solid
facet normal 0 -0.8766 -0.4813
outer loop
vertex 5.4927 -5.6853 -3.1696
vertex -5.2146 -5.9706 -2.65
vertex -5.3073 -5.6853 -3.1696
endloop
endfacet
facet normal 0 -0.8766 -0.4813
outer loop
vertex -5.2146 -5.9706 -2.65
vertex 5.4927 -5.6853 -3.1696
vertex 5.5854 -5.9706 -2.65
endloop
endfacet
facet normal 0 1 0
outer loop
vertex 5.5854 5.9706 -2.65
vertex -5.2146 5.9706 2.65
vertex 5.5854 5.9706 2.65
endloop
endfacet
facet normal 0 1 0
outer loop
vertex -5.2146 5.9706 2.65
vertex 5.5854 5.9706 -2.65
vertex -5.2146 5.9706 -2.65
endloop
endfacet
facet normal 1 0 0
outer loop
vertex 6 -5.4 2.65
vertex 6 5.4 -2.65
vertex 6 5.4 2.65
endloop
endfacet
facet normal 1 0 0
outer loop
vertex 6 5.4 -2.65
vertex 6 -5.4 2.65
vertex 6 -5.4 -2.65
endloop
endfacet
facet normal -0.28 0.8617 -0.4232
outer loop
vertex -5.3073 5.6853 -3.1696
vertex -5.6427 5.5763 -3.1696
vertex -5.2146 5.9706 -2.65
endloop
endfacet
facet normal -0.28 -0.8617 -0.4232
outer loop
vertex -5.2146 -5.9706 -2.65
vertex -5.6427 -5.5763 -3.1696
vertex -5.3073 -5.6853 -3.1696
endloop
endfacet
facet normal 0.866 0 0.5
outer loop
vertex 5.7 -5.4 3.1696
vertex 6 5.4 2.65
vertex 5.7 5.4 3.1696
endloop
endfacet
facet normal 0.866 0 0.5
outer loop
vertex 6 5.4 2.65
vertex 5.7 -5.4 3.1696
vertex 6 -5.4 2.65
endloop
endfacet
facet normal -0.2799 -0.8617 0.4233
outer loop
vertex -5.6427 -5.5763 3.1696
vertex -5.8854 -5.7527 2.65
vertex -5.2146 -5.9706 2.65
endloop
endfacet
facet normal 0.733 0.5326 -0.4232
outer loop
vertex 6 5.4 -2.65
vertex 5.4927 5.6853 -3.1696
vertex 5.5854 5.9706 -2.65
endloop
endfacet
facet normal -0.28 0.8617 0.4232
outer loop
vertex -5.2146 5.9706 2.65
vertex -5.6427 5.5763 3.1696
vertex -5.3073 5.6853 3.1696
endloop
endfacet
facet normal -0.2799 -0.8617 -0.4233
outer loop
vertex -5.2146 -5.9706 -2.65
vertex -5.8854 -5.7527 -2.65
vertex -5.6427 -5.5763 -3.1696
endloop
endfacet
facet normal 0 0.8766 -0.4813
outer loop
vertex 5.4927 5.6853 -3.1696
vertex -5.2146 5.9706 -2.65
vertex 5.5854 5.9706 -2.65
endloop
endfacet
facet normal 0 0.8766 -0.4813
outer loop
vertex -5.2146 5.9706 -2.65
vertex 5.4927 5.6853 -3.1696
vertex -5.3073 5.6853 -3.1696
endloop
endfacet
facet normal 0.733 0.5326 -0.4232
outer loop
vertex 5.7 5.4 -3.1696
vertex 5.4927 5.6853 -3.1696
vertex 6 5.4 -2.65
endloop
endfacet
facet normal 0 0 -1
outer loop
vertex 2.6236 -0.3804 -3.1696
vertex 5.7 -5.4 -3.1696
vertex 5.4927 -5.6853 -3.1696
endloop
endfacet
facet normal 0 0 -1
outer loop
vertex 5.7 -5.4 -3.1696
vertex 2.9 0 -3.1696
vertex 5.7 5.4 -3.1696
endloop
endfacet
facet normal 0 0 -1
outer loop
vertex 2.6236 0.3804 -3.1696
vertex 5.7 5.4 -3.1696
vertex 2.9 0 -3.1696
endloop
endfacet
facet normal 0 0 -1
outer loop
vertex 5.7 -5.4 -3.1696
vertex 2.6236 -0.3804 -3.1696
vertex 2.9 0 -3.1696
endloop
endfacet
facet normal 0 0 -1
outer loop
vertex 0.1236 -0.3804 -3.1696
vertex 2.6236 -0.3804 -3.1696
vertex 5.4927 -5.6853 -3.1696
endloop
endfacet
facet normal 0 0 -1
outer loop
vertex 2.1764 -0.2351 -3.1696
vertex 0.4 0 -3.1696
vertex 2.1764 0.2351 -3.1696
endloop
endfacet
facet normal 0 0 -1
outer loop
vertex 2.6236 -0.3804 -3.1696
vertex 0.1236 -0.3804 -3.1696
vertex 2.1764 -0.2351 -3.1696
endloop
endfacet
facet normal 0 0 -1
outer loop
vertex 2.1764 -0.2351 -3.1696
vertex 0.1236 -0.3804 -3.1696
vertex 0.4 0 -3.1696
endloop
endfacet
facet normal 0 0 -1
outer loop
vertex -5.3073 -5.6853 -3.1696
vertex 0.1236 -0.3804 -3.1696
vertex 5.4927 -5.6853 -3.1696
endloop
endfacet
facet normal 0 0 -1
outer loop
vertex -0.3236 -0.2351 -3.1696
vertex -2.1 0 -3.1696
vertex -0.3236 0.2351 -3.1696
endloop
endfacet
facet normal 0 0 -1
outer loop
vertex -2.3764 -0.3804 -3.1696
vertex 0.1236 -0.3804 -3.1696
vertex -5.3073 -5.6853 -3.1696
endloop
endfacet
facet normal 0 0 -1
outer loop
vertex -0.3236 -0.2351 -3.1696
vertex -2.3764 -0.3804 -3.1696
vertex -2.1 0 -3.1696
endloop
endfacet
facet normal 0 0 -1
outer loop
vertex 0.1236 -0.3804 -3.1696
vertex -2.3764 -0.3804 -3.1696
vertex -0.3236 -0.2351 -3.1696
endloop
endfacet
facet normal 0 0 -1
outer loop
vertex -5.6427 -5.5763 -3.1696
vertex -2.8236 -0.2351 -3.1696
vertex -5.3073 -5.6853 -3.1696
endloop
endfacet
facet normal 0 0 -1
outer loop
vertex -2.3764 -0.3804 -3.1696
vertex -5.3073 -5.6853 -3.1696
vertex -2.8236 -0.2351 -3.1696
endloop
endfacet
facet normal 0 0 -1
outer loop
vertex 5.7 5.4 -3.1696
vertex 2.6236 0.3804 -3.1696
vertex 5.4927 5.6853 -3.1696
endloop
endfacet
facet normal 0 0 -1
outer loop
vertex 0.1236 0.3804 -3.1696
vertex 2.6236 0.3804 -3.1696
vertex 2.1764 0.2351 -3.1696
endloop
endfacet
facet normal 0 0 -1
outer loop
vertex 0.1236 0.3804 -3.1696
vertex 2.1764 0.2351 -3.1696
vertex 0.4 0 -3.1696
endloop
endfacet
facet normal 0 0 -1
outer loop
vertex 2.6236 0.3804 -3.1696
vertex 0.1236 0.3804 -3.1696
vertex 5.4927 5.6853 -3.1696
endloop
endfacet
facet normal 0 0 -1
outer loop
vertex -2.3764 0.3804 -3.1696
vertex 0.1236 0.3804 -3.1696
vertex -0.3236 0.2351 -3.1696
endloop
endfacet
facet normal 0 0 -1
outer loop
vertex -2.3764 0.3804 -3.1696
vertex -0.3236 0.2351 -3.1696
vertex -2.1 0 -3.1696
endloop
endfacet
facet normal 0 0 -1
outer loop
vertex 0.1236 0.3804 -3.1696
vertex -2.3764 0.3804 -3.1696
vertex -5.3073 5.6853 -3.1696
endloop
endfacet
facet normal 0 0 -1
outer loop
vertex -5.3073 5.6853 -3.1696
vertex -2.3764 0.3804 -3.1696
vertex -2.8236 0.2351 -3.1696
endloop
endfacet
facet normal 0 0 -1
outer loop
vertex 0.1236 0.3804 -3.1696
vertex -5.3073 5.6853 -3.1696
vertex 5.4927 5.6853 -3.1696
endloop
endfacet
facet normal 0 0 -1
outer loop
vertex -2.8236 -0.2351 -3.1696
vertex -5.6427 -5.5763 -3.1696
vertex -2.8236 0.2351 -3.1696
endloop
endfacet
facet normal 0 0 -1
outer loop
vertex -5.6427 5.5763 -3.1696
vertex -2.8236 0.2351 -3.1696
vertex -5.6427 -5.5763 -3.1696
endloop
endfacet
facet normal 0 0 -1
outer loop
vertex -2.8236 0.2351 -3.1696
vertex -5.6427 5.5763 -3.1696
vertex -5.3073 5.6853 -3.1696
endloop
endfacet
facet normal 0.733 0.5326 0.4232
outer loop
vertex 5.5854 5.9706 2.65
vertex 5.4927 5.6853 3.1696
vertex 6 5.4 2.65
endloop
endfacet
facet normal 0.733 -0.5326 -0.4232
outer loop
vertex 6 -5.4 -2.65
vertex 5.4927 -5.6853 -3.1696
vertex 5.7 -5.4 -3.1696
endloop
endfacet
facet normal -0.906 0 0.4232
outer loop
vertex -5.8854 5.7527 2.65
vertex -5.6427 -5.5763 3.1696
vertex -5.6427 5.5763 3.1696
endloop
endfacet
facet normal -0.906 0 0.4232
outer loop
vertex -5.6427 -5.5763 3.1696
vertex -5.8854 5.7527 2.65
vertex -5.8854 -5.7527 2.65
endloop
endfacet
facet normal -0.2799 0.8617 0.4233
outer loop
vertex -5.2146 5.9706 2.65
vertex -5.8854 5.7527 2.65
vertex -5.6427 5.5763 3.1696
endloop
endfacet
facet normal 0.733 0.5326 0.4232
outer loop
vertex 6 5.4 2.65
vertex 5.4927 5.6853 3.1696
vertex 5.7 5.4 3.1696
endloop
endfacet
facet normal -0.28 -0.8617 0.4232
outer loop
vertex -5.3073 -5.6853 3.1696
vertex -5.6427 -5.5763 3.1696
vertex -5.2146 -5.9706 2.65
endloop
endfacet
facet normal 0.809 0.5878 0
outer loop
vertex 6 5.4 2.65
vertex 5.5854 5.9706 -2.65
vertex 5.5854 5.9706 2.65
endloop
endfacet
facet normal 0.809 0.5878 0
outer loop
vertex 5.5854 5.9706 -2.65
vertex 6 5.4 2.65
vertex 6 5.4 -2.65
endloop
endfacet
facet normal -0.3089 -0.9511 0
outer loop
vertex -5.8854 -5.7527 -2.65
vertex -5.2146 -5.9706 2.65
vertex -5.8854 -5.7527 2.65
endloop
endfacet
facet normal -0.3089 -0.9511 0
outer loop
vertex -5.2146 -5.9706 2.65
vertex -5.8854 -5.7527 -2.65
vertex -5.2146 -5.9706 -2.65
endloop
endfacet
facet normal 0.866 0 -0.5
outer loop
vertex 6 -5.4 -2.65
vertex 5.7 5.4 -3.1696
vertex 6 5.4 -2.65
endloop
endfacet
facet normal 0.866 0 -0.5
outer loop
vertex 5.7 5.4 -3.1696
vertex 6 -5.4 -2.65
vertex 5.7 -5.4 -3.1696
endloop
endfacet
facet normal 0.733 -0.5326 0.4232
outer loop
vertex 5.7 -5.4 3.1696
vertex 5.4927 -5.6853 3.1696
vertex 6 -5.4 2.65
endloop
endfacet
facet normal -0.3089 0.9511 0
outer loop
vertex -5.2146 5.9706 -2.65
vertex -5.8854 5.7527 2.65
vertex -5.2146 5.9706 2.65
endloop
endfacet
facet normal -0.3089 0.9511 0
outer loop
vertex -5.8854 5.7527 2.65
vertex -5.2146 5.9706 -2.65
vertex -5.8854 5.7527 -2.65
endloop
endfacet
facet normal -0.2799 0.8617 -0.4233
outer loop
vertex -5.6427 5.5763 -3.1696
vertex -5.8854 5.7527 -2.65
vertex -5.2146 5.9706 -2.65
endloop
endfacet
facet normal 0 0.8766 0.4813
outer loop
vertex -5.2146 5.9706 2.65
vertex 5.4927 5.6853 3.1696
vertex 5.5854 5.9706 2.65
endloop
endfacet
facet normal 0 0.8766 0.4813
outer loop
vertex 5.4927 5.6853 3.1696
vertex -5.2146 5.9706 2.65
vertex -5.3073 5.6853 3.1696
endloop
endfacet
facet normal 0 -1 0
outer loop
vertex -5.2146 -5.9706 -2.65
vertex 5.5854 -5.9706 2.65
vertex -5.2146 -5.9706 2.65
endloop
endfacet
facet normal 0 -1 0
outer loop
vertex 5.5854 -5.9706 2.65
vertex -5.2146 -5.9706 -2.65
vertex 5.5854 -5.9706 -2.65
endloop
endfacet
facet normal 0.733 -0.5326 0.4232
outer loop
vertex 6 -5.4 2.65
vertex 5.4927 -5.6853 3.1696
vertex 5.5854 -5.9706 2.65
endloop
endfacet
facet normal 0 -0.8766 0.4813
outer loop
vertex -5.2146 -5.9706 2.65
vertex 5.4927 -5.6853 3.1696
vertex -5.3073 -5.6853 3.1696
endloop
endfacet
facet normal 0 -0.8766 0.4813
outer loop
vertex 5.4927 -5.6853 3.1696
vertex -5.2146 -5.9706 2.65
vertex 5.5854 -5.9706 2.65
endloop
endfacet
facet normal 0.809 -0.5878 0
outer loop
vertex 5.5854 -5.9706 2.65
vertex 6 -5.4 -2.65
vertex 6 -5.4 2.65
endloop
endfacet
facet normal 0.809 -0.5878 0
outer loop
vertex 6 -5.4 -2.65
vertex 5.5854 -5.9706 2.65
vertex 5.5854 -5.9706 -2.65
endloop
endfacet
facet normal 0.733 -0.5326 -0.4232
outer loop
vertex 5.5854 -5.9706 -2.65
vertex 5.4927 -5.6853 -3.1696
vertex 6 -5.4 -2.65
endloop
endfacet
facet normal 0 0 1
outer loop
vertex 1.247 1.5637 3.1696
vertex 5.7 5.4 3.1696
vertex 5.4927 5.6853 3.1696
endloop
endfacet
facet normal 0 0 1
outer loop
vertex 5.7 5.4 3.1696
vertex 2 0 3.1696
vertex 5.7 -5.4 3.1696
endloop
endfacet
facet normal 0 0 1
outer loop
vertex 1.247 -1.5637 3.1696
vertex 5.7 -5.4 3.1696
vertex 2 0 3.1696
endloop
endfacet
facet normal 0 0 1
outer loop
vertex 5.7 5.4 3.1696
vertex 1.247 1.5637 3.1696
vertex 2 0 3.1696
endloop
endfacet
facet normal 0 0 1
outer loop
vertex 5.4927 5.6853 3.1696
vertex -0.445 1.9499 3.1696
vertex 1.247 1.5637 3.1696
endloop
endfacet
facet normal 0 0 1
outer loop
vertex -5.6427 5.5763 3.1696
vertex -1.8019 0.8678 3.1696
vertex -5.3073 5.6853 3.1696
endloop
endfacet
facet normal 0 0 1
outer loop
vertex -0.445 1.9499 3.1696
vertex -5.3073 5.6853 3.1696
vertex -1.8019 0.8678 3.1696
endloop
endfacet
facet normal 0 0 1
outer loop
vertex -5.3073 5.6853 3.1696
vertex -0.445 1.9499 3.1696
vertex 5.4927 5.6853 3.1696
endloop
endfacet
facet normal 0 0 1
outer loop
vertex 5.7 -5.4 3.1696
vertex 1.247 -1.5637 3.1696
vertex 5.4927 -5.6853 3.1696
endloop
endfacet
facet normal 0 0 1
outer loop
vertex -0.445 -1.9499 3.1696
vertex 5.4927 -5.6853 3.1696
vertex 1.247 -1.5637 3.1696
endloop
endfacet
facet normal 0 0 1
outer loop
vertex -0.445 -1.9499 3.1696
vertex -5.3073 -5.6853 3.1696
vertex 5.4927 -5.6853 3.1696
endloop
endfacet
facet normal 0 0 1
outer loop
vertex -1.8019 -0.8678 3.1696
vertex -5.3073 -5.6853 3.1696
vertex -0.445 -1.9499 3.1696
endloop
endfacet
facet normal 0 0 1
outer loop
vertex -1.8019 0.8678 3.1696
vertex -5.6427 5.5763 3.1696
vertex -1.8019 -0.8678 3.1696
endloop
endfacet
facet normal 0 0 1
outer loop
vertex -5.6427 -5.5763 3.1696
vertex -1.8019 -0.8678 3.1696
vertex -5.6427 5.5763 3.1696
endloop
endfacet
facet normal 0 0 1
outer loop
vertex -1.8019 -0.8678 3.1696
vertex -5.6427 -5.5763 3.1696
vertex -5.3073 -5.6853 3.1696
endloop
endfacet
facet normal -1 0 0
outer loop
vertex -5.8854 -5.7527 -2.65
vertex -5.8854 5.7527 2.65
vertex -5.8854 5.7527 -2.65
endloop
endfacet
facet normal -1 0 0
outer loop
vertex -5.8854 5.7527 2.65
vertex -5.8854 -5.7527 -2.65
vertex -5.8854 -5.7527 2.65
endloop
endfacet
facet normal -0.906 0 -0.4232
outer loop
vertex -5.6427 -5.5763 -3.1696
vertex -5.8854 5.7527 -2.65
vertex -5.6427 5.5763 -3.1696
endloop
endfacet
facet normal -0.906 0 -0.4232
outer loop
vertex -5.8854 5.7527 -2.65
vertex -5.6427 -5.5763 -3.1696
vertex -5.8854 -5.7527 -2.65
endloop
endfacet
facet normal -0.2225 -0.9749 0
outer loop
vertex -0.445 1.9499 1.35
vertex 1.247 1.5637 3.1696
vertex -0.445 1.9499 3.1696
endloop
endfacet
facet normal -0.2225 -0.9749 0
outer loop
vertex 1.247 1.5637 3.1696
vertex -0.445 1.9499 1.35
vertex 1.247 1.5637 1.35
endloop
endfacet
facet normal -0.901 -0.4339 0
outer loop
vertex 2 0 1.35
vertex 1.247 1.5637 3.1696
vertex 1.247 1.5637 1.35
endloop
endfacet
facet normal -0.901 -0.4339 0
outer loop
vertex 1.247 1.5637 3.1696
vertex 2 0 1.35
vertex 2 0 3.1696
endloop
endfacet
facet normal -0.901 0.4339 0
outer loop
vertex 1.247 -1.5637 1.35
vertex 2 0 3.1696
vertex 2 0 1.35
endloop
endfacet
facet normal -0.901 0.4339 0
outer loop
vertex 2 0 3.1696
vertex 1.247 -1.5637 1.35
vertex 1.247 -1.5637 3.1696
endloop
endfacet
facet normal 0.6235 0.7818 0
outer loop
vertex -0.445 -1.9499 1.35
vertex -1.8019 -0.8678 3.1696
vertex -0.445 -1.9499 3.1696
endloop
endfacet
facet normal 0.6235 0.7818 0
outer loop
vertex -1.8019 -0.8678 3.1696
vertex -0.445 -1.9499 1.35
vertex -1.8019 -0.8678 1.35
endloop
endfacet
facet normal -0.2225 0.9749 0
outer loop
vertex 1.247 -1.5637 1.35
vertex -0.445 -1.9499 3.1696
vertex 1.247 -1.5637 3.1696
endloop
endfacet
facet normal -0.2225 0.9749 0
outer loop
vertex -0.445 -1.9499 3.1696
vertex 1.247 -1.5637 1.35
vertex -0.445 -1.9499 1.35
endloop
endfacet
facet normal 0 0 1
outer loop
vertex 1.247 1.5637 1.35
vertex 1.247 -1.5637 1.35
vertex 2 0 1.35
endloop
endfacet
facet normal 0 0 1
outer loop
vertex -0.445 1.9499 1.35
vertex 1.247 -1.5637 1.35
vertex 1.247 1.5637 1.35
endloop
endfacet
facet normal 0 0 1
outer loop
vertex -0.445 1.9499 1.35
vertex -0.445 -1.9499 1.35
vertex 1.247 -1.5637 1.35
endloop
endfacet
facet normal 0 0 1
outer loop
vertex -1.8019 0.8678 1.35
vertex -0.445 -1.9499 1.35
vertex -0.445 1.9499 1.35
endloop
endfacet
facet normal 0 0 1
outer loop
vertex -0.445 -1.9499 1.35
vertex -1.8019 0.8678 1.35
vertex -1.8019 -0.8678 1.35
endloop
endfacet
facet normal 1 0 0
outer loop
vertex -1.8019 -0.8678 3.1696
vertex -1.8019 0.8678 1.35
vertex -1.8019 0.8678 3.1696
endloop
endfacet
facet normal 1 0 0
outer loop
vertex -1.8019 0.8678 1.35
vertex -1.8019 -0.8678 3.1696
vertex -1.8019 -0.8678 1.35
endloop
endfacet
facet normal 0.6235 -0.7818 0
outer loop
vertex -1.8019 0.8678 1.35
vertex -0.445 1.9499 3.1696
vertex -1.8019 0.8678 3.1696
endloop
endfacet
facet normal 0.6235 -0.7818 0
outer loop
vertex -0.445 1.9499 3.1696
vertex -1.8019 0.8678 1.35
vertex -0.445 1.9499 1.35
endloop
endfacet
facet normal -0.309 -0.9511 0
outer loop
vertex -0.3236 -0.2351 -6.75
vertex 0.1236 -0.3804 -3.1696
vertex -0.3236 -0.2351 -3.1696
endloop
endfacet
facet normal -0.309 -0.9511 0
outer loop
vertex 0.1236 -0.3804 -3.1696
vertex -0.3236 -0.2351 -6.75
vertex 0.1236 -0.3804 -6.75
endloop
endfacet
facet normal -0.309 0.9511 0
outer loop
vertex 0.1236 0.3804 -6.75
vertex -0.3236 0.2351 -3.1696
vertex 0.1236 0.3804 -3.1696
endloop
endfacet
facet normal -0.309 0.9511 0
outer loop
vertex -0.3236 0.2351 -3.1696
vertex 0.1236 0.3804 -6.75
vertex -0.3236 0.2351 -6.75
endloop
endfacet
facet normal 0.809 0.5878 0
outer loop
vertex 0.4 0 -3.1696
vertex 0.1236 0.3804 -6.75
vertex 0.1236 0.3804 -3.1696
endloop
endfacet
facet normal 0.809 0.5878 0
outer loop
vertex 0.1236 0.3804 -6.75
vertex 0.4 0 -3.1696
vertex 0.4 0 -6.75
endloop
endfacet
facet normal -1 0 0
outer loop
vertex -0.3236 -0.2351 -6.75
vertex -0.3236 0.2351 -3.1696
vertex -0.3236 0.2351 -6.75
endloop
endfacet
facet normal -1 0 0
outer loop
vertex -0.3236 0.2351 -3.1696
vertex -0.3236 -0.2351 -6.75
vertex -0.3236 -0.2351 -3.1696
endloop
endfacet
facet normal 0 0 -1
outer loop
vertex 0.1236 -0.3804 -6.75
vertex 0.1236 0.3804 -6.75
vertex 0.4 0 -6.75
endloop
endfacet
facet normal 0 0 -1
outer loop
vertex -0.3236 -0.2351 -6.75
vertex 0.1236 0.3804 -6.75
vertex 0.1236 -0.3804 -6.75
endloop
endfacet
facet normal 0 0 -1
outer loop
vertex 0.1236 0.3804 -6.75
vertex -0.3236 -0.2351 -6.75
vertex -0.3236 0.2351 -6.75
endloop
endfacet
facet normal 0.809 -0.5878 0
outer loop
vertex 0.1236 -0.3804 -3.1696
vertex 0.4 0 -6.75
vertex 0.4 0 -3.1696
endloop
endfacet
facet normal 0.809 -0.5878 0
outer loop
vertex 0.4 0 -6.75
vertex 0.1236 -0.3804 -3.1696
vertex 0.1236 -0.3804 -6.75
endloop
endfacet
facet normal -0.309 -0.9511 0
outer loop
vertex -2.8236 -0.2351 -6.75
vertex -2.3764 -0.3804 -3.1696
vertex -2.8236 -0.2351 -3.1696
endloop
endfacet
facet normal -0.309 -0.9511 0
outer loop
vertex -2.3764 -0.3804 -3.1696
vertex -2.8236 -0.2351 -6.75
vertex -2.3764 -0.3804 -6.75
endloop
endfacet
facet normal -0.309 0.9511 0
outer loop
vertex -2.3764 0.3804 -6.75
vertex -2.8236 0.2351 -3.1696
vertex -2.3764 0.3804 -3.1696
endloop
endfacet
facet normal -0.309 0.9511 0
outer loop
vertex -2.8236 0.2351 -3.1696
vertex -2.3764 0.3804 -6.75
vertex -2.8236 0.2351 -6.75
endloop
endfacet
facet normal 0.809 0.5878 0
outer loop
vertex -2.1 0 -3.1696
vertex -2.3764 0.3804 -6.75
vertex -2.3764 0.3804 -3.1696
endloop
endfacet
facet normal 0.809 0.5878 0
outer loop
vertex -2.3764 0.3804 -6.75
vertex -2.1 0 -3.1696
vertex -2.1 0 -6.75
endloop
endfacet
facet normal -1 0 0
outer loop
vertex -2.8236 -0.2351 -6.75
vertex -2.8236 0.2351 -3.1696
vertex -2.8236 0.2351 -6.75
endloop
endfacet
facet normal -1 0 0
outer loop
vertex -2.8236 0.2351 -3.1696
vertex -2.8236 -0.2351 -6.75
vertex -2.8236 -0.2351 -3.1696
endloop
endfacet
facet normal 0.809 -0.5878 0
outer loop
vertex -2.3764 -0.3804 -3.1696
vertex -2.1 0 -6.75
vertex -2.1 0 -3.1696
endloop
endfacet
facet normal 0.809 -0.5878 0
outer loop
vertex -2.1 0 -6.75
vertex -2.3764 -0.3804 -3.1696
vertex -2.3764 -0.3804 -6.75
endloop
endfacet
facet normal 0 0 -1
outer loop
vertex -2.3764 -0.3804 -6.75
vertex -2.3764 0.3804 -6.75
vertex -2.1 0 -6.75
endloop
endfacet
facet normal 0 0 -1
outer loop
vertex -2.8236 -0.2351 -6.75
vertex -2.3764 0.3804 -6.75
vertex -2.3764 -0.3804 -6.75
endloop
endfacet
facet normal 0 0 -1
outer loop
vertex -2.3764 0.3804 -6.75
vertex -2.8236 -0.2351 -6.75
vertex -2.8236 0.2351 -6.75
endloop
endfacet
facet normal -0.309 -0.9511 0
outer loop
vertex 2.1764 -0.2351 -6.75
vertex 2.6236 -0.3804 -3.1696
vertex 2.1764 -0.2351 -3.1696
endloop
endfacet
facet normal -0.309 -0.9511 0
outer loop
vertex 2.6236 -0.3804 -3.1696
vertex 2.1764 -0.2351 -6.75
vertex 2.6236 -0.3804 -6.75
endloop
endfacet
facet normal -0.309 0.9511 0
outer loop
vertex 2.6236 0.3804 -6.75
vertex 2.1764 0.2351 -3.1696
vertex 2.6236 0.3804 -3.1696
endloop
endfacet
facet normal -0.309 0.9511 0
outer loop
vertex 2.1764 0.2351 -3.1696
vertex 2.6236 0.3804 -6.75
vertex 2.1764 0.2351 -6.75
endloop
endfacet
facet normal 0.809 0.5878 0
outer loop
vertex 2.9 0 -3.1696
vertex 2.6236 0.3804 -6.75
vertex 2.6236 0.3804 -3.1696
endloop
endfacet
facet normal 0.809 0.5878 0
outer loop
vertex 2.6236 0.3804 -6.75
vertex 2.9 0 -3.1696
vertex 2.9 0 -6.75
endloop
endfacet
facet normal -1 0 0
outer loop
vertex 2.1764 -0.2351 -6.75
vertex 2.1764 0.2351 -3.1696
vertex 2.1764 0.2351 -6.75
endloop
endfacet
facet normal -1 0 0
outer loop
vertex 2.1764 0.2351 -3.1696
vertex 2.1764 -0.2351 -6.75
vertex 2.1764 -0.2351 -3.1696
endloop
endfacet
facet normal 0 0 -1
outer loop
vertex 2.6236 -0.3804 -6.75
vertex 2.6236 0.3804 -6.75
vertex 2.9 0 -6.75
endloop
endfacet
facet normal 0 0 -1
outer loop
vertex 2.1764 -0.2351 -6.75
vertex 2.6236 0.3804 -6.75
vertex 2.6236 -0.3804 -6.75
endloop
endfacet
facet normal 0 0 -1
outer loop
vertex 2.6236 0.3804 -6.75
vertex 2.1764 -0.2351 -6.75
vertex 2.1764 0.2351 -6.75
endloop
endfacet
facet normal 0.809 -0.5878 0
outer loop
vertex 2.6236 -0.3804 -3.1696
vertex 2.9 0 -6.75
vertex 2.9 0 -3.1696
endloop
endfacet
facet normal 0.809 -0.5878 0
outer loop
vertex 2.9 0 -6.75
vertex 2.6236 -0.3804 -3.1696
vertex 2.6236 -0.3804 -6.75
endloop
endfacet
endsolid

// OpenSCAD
// Parameters
body_L = 12; //[6:24:0.5]
body_W = 12; //[6:24:0.5]
body_H = 6.5; //[3.25:13:0.25]
wall_t = 1.0; //[0.5:2.0:0.1]
adjuster_d = 4.0; //[2.0:8.0:0.25]
adjuster_depth = 1.5; //[0.75:3.0:0.1]
pin_d = 0.8; //[0.4:1.6:0.05]
pin_len = 3.5; //[1.75:7.0:0.25]
pin_spacing = 5.0; //[2.5:10.0:0.25]
pin_row_y = 0.0; //[-3.0:3.0:0.25]
mark_w = 2.0; //[1.0:4.0:0.25]
mark_h = 1.0; //[0.5:2.0:0.1]
mark_t = 0.4; //[0.2:1.0:0.05]
fillet_r = 0.6; //[0.3:1.2:0.05]
overlap = 0.8; //[0.5:2.0:0.1]

// Main body with corner fillets
module main_body() {
  color([0.0, 0.4, 0.2]) // PCB green
  minkowski() {
    translate([0, 0, 0])
      cube([body_L - 2*fillet_r, body_W - 2*fillet_r, body_H - 2*fillet_r], center=true);
    sphere(r=fillet_r);
  }
}

// Top adjuster recess
module top_adjuster_recess() {
  translate([0, 0, body_H/2 - adjuster_depth/2])
    cylinder(r=adjuster_d/2, h=adjuster_depth + overlap, center=true);
}

// Mounting pins
module mounting_pins() {
  color("Silver")
  union() {
    translate([0, pin_row_y, -body_H/2 - pin_len/2 + overlap/2])
      cylinder(r=pin_d/2, h=pin_len + overlap, center=true);
    translate([-pin_spacing/2, pin_row_y, -body_H/2 - pin_len/2 + overlap/2])
      cylinder(r=pin_d/2, h=pin_len + overlap, center=true);
    translate([pin_spacing/2, pin_row_y, -body_H/2 - pin_len/2 + overlap/2])
      cylinder(r=pin_d/2, h=pin_len + overlap, center=true);
  }
}

// Side marking
module side_markings() {
  color("DimGray")
  translate([0, body_W/2 + mark_t/2 - overlap, 0])
    cube([mark_w, mark_t, mark_h], center=true);
}

// Complete model
module complete_model() {
  difference() {
    main_body();
    top_adjuster_recess();
  }
  mounting_pins();
  side_markings();
}

// Render the complete model
complete_model();
